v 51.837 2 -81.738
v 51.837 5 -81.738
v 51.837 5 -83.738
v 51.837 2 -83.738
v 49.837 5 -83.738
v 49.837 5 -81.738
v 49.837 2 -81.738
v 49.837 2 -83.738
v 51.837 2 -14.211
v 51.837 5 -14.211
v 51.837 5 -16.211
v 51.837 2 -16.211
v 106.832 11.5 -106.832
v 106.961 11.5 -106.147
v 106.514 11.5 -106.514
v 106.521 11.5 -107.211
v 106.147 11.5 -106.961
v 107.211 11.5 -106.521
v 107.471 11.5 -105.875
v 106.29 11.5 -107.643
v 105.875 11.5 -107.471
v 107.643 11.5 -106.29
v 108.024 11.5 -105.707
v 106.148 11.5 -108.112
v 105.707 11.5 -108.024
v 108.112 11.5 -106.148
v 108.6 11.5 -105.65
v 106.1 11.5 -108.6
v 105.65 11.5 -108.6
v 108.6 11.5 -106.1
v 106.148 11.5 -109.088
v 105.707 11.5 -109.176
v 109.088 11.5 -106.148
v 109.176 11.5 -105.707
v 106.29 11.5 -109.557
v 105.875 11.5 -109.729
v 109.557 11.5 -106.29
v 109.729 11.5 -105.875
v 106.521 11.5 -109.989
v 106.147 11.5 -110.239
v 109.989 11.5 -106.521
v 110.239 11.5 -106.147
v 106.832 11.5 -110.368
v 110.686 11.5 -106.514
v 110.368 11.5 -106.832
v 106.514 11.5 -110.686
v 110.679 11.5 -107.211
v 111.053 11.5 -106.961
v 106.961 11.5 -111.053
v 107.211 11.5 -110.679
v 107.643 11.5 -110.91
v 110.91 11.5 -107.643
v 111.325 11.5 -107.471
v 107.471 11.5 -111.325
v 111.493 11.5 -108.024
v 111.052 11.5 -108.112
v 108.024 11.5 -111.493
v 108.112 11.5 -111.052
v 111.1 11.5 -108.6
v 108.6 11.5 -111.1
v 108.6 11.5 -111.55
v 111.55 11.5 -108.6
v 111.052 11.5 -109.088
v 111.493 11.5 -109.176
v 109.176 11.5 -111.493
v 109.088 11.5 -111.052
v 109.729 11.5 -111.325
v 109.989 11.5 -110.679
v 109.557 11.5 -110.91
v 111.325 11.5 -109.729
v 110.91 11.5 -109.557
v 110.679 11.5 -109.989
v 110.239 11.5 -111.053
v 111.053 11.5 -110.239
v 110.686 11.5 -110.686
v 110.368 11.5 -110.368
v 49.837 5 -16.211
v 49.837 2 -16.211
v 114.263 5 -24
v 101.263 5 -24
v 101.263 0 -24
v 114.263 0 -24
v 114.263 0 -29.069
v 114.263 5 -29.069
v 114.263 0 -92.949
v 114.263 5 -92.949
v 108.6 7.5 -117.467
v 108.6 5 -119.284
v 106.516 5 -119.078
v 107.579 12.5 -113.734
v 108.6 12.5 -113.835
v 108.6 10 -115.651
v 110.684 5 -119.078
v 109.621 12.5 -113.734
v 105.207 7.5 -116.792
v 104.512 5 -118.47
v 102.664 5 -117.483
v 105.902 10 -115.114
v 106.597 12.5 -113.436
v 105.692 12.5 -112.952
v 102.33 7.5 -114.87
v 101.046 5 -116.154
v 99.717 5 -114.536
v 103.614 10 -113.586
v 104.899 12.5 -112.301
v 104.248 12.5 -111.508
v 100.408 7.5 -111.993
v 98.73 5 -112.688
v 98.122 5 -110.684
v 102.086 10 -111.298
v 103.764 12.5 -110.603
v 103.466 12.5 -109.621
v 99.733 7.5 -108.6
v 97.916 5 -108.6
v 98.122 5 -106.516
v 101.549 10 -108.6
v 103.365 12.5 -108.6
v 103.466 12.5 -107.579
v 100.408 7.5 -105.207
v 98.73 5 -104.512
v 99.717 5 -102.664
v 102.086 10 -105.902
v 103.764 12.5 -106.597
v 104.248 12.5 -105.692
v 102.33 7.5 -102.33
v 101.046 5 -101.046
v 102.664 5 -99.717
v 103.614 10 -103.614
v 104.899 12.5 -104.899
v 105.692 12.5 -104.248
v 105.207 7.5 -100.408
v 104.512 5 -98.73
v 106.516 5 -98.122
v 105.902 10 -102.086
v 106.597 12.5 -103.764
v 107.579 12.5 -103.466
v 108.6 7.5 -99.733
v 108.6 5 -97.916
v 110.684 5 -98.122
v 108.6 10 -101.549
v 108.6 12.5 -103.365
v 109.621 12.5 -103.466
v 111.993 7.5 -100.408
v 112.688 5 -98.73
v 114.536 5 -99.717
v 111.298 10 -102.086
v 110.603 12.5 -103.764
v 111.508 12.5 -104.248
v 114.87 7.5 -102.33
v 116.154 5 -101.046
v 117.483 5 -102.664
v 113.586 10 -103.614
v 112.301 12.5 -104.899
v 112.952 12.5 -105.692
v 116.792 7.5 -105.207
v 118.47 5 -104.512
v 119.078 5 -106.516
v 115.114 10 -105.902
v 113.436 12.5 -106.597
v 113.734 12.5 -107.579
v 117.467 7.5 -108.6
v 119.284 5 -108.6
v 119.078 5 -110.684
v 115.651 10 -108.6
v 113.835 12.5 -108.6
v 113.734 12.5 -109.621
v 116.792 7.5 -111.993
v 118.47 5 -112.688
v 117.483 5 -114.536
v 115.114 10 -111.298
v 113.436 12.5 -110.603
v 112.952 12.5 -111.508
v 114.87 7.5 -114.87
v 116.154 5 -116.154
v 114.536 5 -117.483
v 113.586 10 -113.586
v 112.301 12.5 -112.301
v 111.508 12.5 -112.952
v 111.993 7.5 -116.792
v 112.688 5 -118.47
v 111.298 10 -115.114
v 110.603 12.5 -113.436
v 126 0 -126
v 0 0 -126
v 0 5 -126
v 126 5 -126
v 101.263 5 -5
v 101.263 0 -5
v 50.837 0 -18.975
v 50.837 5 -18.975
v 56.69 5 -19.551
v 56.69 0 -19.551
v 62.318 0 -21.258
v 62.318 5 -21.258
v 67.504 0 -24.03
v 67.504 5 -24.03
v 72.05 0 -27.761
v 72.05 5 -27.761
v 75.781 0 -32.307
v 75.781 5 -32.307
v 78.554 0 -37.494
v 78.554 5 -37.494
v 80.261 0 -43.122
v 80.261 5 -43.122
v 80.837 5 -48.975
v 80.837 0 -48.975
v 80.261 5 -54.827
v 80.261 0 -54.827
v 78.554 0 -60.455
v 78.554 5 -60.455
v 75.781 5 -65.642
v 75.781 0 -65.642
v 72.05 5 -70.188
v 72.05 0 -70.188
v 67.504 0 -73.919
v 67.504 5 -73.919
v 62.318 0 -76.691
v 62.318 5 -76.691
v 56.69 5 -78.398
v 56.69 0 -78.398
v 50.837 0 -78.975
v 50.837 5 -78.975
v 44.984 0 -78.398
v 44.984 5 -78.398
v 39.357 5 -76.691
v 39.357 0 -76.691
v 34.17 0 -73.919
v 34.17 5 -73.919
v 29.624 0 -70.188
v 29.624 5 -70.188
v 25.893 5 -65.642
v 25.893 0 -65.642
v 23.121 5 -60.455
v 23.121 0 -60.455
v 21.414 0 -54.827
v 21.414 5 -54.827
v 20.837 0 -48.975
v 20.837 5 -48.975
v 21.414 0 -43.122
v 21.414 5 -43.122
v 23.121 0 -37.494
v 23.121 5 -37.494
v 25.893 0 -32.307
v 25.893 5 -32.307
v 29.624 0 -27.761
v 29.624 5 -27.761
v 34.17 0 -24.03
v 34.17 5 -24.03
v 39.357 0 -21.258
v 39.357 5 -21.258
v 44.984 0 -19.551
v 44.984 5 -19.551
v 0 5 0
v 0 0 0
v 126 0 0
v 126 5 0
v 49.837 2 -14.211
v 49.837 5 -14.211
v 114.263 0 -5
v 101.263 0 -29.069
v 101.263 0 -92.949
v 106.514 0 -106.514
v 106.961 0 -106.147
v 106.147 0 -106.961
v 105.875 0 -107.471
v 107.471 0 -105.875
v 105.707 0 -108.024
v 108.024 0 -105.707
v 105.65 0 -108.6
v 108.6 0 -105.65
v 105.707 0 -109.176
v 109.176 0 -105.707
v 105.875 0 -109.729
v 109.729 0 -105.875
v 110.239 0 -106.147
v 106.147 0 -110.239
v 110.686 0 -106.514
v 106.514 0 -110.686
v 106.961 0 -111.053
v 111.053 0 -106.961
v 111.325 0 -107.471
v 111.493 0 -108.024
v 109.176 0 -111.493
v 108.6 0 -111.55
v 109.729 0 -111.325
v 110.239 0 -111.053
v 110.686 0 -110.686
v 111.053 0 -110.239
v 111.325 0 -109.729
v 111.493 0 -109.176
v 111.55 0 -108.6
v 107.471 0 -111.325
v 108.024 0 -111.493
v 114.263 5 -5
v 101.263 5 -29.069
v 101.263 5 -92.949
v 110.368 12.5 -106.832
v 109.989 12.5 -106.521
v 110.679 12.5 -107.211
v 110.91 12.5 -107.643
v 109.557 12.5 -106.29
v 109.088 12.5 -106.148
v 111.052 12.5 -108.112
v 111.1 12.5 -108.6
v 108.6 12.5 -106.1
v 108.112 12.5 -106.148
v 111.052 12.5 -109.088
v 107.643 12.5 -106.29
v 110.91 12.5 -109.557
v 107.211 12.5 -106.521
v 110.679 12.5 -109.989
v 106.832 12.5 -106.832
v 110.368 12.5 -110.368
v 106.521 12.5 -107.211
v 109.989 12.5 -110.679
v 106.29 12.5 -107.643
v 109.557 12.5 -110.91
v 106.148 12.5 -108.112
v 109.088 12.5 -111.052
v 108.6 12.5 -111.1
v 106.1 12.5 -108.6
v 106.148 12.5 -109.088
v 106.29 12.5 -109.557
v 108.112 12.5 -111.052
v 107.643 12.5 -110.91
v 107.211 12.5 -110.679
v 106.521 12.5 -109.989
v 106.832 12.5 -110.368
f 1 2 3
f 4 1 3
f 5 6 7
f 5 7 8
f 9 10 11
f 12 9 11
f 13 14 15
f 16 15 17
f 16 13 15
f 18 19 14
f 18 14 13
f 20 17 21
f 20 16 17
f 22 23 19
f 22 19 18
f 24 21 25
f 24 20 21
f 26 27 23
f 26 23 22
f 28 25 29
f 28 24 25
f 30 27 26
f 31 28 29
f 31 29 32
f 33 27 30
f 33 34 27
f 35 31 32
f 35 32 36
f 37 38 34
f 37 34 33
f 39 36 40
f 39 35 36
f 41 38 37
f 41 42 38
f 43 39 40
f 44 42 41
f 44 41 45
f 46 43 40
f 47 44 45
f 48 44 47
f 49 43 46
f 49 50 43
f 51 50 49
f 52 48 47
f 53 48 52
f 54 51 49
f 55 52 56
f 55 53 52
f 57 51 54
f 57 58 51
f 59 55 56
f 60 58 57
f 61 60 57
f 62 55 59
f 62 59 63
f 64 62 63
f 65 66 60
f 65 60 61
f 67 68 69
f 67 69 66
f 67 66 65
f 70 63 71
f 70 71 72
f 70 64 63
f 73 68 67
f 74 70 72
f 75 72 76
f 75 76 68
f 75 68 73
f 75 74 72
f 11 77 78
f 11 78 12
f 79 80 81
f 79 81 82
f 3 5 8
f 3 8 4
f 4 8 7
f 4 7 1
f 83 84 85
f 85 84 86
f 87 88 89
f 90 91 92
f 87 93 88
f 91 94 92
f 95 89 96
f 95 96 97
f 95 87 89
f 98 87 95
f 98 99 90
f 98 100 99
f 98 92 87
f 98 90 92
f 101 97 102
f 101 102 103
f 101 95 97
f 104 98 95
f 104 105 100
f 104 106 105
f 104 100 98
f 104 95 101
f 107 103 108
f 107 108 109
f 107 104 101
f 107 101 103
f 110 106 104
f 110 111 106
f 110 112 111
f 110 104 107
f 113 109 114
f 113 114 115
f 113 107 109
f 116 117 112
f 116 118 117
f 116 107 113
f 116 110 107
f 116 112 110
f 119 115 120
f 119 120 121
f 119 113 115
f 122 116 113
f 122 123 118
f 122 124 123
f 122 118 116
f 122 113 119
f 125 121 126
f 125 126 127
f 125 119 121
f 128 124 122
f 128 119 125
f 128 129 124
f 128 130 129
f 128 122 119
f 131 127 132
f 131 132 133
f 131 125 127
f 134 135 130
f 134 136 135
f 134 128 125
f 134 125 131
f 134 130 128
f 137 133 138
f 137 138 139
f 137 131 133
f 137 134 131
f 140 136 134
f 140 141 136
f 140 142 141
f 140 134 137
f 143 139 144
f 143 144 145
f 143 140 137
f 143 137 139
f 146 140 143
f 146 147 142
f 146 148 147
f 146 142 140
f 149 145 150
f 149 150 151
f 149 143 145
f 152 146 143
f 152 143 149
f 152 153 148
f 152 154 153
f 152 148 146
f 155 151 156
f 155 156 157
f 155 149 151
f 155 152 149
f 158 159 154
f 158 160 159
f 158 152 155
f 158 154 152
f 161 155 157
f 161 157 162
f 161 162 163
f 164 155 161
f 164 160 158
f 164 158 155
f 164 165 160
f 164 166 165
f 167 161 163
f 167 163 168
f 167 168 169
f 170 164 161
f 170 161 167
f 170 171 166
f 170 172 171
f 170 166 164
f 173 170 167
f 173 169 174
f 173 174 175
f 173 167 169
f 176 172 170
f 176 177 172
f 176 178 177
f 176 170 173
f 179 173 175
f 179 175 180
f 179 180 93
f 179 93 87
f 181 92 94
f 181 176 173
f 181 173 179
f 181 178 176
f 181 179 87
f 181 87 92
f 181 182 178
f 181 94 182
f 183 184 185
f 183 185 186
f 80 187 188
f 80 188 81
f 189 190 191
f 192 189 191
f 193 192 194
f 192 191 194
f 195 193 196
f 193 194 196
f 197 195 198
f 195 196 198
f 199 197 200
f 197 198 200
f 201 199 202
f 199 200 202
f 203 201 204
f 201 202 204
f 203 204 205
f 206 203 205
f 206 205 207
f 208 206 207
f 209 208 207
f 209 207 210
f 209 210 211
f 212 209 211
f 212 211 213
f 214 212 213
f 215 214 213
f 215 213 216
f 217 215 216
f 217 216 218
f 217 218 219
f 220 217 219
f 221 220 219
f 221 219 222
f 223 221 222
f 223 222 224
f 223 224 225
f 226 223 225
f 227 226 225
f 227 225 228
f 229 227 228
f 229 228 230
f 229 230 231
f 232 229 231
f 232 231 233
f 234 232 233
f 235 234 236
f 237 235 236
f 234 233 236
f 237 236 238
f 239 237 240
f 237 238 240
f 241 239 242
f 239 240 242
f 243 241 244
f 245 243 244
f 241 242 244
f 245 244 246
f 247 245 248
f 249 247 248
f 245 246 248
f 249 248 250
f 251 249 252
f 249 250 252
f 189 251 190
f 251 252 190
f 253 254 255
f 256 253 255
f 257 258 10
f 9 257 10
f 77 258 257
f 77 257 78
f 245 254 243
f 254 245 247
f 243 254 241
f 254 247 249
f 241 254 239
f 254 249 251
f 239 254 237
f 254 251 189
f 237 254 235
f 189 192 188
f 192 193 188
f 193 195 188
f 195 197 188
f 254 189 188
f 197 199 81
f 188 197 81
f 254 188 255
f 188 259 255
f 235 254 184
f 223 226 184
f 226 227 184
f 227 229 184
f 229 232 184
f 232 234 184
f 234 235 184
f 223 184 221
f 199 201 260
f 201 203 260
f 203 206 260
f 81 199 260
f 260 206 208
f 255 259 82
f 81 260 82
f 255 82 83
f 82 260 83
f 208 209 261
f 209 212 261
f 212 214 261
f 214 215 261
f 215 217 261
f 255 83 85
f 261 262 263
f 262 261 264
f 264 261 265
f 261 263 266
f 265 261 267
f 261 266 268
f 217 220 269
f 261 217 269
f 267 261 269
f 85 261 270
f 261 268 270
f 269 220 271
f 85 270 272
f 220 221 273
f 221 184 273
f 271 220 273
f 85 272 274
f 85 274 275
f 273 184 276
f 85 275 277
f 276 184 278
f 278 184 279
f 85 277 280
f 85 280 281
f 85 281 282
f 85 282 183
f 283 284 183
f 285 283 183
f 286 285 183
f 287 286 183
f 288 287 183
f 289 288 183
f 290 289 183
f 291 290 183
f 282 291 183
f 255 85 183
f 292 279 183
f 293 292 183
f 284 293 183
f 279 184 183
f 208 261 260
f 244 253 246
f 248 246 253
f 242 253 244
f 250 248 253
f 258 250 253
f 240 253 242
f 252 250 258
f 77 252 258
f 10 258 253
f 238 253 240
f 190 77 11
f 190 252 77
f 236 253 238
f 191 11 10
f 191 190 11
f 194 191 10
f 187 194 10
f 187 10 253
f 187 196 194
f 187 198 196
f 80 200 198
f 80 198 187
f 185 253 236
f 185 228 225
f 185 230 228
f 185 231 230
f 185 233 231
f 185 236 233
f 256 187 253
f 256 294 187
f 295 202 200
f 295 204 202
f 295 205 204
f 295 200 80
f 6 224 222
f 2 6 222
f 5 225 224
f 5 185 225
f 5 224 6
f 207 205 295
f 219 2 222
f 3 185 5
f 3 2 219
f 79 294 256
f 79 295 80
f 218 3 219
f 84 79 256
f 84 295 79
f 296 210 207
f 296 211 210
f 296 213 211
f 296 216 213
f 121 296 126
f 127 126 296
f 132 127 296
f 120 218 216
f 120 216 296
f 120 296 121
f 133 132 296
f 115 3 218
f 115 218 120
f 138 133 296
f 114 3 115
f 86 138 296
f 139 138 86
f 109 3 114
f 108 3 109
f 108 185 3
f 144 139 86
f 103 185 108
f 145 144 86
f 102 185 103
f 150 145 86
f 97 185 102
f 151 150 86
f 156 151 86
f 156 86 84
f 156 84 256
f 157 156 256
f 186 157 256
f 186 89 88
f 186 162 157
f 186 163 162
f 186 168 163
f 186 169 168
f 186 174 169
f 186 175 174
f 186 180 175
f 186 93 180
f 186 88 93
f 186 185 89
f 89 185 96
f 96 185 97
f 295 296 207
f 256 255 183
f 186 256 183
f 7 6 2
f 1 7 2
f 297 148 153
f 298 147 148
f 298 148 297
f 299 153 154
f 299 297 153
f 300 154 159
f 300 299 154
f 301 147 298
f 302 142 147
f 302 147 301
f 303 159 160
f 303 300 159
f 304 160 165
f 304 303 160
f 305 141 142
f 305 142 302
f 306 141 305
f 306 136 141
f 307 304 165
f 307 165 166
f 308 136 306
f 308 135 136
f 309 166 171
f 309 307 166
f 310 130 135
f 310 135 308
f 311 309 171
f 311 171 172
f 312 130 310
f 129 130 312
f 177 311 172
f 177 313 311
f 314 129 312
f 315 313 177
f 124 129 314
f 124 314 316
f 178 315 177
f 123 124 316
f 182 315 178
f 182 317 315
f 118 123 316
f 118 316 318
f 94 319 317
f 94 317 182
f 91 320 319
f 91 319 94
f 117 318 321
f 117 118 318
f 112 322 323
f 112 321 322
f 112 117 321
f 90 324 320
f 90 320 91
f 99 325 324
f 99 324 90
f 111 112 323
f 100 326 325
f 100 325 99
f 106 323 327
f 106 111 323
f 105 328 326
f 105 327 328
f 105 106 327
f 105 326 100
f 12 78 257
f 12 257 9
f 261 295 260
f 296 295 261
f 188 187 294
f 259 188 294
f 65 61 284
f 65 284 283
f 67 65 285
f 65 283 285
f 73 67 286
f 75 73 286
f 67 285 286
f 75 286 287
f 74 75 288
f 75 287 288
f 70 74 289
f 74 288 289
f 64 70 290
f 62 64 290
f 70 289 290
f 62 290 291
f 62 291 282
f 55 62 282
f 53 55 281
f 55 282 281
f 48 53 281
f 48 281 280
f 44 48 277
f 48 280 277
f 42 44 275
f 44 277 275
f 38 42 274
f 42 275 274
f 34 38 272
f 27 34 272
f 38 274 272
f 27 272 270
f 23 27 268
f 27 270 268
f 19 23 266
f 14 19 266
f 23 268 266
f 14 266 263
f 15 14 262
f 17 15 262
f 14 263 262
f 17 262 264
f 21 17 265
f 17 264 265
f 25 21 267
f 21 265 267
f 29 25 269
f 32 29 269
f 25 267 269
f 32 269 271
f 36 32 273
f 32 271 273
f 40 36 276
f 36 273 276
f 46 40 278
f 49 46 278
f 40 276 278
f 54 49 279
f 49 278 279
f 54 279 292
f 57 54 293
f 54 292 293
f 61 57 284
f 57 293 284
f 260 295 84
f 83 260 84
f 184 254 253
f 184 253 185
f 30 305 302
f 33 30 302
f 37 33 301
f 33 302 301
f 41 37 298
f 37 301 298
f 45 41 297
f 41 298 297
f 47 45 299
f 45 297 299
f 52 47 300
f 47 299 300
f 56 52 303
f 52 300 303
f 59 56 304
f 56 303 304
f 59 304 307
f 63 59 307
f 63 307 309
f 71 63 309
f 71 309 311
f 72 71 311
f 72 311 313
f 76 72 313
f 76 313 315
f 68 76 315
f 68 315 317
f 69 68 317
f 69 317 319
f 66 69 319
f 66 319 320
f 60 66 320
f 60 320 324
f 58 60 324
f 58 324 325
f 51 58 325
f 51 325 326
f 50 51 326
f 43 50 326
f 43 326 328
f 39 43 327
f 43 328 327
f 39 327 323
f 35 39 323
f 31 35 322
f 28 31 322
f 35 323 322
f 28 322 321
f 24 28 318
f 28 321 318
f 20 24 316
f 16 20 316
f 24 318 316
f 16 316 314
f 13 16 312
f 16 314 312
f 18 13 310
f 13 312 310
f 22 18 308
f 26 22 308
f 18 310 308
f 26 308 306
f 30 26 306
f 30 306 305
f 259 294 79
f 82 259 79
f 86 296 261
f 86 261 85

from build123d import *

# Parameters (mm, degrees)
SKETCH1_W           = 126
SKETCH1_H           = 126
BOSS_EXTRUDE1_DEPTH = 5
SKETCH3_R           = 12.5
BOSS_EXTRUDE2_DEPTH = 7.5
SKETCH4_R           = 2.95
CUT_EXTRUDE1_DEPTH  = 11.5
SKETCH6_R           = 2.5
CUT_EXTRUDE2_DEPTH  = 179.628805068
CHAMFER1_SIZE       = 10
CHAMFER1_SIZE_2     = 7.26542528
SKETCH8_W           = 13
SKETCH8_H           = 63.879672954
SKETCH8_H_2         = 19
CUT_EXTRUDE3_DEPTH  = 179.348675353
SKETCH9_R           = 30
CUT_EXTRUDE4_DEPTH  = 179.348675353
SKETCH11_W          = 2
SKETCH11_H          = 2
CUT_EXTRUDE5_DEPTH  = 3


with BuildPart() as part:
    # Sketch1 → Boss-Extrude1 (new body)
    with BuildSketch(Plane(origin=(0, 0, 0), x_dir=(1, 0, 0), z_dir=(0, 1, 0))):
        with Locations((63, 63)):
            Rectangle(SKETCH1_W, SKETCH1_H)
    extrude(amount=BOSS_EXTRUDE1_DEPTH)

    # Sketch3 → Boss-Extrude2 (add)
    with BuildSketch(Plane(origin=(0, 5, 0), x_dir=(1, 0, 0), z_dir=(0, 1, 0))):
        with Locations(Location((108.6, 108.6, 0), (0, 0, 90))):
            Circle(SKETCH3_R)
    extrude(amount=BOSS_EXTRUDE2_DEPTH)

    # Sketch4 → Cut-Extrude1 (cut)
    with BuildSketch(Plane.XZ):
        with Locations(Location((108.6, -108.6, 0), (0, 0, 270))):
            Circle(SKETCH4_R)
    extrude(amount=-CUT_EXTRUDE1_DEPTH, mode=Mode.SUBTRACT)

    # Sketch6 → Cut-Extrude2 (cut, through all)
    with BuildSketch(Plane(origin=(0, 12.5, 0), x_dir=(1, 0, 0), z_dir=(0, 1, 0))):
        with Locations(Location((108.6, 108.6, 0), (0, 0, 270))):
            Circle(SKETCH6_R)
    extrude(amount=-CUT_EXTRUDE2_DEPTH, mode=Mode.SUBTRACT)

    # Chamfer1
    # the kernel refuses this chamfer: 10, 7.26542528 mm, written as the material it takes off along each edge
    with BuildSketch(Plane(origin=(108.6, 12.5, -108.6), x_dir=(0, 0, -1), z_dir=(1, 0, 0))) as chamfer1_piece_1_section:
        Polygon((12.5, -CHAMFER1_SIZE), (12.5 - CHAMFER1_SIZE_2, 0), (12.5, 0), align=None)
    chamfer1_piece_1 = revolve(axis=Axis((108.6, 12.5, -108.6), (0, 1, 0)), mode=Mode.PRIVATE)
    chamfer1_piece_1 = split(chamfer1_piece_1, bisect_by=Plane(origin=(108.6, 5, -100.650989912), z_dir=(0, 1, 0)), keep=Keep.TOP, mode=Mode.PRIVATE)
    add(chamfer1_piece_1, mode=Mode.SUBTRACT)

    # Sketch8 → Cut-Extrude3 (cut, through all)
    with BuildSketch(Plane(origin=(0, 5, 0), x_dir=(1, 0, 0), z_dir=(0, 1, 0))):
        with Locations((107.763328316, 61.0093315)):
            Rectangle(SKETCH8_W, SKETCH8_H)
        with Locations((107.763328316, 14.5)):
            Rectangle(SKETCH8_W, SKETCH8_H_2)
    extrude(amount=-CUT_EXTRUDE3_DEPTH, mode=Mode.SUBTRACT)

    # Sketch9 → Cut-Extrude4 (cut, through all)
    with BuildSketch(Plane(origin=(0, 5, 0), x_dir=(1, 0, 0), z_dir=(0, 1, 0))):
        with Locations(Location((50.837155032, 48.974583989, 0), (0, 0, 270))):
            Circle(SKETCH9_R)
    extrude(amount=-CUT_EXTRUDE4_DEPTH, mode=Mode.SUBTRACT)

    # Sketch11 → Cut-Extrude5 (cut)
    with BuildSketch(Plane(origin=(0, 5, 0), x_dir=(1, 0, 0), z_dir=(0, 1, 0))):
        with Locations((50.837155032, 82.738467737)):
            Rectangle(SKETCH11_W, SKETCH11_H)
        with Locations((50.837155032, 15.21070024)):
            Rectangle(SKETCH11_W, SKETCH11_H)
    extrude(amount=-CUT_EXTRUDE5_DEPTH, mode=Mode.SUBTRACT)


solid = part.part
